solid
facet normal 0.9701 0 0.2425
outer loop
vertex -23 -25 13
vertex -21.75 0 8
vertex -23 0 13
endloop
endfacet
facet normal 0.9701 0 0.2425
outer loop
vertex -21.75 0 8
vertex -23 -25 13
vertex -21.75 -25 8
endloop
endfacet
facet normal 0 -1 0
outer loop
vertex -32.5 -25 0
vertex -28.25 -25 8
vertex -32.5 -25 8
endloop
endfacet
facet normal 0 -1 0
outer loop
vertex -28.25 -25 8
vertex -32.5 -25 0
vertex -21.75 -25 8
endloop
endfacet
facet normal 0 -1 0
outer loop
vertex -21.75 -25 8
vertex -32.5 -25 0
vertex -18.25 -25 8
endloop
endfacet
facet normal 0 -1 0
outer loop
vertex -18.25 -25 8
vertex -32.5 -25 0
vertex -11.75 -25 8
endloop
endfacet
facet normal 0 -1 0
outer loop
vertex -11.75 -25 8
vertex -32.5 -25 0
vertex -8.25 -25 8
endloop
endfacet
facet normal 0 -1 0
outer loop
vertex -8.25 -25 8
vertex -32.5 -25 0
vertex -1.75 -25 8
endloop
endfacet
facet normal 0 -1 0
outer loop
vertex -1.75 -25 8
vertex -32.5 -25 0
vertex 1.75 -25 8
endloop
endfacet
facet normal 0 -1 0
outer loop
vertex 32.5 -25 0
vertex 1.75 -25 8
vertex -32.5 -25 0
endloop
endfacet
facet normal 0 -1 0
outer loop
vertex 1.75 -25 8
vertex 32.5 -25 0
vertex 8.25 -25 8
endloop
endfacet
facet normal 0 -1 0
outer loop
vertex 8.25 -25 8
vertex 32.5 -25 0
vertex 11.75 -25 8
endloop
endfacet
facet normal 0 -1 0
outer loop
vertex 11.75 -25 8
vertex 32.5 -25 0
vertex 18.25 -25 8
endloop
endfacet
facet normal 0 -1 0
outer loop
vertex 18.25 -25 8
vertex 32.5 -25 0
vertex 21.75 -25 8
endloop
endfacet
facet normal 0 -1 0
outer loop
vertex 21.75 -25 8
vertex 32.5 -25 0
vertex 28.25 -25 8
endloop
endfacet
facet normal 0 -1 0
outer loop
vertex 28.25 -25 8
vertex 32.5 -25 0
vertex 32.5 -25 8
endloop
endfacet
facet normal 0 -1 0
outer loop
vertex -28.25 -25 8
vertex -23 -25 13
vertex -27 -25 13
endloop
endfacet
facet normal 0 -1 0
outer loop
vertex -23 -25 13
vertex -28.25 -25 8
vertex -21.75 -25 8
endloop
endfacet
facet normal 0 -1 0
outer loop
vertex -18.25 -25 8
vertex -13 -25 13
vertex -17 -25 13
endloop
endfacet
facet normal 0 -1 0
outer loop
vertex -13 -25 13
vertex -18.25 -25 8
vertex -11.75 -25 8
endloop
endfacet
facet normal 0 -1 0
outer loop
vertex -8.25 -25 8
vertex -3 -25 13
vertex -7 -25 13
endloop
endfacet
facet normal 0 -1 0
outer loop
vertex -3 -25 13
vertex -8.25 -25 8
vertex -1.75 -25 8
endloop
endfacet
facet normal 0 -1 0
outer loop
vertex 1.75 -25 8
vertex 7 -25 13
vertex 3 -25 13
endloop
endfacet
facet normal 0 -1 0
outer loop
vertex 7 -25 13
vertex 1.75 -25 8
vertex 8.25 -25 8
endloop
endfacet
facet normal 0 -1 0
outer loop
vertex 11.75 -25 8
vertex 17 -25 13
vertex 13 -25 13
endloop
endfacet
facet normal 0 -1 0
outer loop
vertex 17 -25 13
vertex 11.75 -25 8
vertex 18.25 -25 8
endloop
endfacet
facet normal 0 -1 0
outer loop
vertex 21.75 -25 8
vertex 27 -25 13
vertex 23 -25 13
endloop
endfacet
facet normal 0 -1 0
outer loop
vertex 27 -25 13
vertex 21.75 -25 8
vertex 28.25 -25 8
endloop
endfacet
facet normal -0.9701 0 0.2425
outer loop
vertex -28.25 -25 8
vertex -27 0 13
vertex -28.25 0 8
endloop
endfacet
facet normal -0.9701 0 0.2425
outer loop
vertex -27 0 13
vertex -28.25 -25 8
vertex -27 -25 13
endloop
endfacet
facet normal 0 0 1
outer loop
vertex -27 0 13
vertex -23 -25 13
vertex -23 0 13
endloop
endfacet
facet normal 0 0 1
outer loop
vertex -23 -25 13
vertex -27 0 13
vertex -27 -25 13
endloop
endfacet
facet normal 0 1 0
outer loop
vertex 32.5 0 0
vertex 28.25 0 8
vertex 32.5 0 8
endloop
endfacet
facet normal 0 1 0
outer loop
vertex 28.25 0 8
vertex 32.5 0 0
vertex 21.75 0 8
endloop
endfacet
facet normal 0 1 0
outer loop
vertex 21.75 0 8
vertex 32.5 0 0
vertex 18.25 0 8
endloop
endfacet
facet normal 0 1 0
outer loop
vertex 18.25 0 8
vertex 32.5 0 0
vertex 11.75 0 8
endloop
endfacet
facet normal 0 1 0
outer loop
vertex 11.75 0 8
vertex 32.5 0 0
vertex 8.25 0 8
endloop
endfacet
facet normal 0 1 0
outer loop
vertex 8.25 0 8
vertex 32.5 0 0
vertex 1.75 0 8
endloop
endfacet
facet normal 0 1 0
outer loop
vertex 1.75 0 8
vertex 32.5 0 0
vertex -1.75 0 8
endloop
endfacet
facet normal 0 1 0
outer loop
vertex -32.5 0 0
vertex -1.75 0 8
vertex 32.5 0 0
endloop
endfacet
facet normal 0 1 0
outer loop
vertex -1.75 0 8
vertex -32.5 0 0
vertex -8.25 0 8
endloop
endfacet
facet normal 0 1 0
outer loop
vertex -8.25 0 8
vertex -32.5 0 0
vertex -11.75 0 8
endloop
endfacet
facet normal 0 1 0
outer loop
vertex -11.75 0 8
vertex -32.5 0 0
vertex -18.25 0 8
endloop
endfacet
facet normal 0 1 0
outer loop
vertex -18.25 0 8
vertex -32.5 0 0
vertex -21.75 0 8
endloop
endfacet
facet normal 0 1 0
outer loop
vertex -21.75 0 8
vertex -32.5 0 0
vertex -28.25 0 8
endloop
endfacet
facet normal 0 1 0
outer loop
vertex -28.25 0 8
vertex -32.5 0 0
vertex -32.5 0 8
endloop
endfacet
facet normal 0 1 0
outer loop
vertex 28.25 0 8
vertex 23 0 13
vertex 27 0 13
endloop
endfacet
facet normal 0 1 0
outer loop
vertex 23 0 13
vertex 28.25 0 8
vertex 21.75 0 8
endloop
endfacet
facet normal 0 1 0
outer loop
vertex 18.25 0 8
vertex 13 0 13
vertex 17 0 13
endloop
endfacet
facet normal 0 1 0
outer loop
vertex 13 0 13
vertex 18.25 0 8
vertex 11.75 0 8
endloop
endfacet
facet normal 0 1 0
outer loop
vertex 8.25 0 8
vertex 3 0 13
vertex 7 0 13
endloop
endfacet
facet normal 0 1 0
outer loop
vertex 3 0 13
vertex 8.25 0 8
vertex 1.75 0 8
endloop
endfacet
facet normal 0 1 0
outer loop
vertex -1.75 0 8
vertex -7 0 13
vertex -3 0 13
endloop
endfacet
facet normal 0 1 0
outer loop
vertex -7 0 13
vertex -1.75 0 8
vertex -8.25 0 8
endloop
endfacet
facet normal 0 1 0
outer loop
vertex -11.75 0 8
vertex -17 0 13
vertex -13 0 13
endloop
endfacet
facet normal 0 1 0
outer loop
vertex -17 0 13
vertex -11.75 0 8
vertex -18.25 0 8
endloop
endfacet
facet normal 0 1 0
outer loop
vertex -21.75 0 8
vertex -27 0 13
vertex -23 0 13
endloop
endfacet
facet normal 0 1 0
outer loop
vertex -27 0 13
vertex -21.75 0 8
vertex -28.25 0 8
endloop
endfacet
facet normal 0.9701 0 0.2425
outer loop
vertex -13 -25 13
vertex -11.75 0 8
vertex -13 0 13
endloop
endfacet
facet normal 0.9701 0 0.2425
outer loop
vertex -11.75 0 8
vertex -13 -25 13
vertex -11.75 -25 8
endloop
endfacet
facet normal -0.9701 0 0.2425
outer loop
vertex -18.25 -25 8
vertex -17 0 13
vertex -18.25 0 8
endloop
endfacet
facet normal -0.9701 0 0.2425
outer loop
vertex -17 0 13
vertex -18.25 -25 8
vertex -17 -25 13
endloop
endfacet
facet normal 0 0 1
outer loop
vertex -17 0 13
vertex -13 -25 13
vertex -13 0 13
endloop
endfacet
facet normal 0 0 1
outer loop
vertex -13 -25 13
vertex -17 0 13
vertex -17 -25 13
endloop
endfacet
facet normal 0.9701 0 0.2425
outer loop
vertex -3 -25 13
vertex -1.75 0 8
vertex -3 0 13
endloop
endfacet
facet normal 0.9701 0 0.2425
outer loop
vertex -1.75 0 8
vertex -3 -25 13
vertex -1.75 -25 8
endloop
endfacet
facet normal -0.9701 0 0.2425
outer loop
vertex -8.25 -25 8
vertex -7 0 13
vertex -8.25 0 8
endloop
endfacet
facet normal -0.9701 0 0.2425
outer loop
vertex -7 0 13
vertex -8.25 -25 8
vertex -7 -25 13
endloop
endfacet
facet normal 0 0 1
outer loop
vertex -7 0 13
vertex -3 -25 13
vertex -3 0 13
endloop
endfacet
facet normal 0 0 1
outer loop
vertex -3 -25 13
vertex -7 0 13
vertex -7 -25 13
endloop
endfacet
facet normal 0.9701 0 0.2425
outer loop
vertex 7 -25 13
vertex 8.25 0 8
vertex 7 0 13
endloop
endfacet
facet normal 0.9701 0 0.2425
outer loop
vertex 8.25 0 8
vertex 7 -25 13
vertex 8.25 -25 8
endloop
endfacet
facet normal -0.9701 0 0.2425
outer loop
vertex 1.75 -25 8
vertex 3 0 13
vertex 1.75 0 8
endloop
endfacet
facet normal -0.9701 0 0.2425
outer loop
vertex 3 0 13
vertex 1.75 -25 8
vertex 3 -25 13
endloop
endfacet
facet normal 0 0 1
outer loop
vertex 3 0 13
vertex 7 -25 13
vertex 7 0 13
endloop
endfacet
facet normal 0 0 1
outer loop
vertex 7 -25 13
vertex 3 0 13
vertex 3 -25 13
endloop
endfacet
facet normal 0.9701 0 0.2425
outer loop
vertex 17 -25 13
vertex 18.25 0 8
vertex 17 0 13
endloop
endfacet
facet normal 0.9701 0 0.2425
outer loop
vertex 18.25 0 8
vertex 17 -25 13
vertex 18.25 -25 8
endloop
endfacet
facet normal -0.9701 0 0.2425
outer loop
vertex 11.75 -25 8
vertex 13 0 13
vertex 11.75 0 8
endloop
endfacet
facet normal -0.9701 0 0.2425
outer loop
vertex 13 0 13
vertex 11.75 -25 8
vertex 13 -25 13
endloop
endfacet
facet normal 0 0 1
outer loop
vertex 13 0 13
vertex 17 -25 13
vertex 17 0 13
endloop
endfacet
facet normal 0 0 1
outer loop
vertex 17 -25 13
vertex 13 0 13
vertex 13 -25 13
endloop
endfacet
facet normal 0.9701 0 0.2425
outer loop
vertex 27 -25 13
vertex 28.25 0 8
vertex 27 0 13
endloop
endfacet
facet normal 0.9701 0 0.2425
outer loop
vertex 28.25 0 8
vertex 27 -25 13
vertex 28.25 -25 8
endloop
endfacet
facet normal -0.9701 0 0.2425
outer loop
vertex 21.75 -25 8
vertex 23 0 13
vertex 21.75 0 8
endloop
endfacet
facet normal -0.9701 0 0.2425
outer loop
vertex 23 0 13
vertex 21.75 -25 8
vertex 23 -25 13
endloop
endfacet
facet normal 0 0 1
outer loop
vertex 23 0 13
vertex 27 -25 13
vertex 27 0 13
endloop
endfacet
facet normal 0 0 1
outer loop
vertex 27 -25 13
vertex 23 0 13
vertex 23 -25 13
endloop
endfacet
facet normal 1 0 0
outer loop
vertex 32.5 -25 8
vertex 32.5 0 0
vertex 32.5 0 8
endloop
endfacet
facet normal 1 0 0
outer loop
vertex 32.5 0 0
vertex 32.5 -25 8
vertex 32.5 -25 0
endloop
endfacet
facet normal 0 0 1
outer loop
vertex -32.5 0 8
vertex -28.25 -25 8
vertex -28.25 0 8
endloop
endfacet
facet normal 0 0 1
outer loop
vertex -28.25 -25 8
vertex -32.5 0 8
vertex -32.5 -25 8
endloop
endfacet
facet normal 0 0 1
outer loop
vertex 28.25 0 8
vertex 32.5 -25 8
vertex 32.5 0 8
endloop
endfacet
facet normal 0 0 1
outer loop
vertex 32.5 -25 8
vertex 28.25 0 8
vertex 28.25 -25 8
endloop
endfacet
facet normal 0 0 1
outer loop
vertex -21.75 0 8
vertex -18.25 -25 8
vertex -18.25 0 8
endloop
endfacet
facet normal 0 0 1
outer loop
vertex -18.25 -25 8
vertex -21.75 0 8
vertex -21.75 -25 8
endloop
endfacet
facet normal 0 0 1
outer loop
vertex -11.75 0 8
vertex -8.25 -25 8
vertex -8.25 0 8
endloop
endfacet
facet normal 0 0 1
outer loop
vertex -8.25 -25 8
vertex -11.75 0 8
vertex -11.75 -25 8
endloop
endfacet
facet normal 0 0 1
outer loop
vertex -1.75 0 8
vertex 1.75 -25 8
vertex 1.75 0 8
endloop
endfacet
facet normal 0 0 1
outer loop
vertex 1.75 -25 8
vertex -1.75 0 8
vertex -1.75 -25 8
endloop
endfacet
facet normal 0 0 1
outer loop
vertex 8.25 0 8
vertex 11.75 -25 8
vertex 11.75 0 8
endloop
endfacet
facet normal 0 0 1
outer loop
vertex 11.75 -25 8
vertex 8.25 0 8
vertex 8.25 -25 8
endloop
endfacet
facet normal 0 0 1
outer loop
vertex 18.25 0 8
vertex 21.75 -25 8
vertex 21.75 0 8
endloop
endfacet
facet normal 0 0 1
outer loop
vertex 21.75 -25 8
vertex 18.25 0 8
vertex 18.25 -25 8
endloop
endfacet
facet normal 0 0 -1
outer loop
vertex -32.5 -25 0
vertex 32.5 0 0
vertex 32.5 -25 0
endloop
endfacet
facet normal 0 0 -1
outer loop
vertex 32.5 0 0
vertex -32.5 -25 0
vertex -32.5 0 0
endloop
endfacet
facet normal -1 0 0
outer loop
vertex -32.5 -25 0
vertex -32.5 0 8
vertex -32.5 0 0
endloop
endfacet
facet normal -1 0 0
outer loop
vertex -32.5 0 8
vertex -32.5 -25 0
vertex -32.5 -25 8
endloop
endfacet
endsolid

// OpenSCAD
$fn = 32;

// ----------------------------------------------------------------------
// Toothed rack, 6 teeth
// 10 mm pitch, 5 mm teeth
// ----------------------------------------------------------------------

// --- parameters (mm) ---
bar_w = 25;   // bar width (Y)
bar_h = 8;    // bar height (Z)
teeth = 6;    // number of teeth
pitch = 10;   // tooth pitch
tooth_h = 5;  // tooth height above the bar
root_w = 7;   // tooth width at the root
crest_w = 4;  // tooth width at the crest

// --- derived feature positions (mm) ---
span = (teeth - 1) * pitch;  // = 50   distance between the outer teeth
bar_l = span + root_w + 8;   // = 65   bar length: teeth plus 4 mm at each end
tooth_x = -span / 2;         // = -25   X of the first tooth
height = bar_h + tooth_h;    // = 13   overall height
feature_centers = [
  [tooth_x + 0 * pitch, -bar_w / 2],
  [tooth_x + 1 * pitch, -bar_w / 2],
  [tooth_x + 2 * pitch, -bar_w / 2],
  [tooth_x + 3 * pitch, -bar_w / 2],
  [tooth_x + 4 * pitch, -bar_w / 2],
  [tooth_x + 5 * pitch, -bar_w / 2]
];   // tooth centre line, drives the tooth loop

// bar with a rack of teeth, one extruded trapezoium per centre
module rack_tooth() {
  linear_extrude(height = bar_w)
    polygon(points = [
      [0, 0],
      [root_w, 0],
      [root_w / 2 + crest_w / 2, tooth_h + 1],
      [root_w / 2 - crest_w / 2, tooth_h + 1]
    ]);
}

union() {
  translate([-bar_l / 2, -bar_w, 0]) cube([bar_l, bar_w, bar_h]);
  for (centre = feature_centers)
    translate([centre[0] - root_w / 2, 0, bar_h - 1]) rotate([90, 0, 0]) rack_tooth();
}
